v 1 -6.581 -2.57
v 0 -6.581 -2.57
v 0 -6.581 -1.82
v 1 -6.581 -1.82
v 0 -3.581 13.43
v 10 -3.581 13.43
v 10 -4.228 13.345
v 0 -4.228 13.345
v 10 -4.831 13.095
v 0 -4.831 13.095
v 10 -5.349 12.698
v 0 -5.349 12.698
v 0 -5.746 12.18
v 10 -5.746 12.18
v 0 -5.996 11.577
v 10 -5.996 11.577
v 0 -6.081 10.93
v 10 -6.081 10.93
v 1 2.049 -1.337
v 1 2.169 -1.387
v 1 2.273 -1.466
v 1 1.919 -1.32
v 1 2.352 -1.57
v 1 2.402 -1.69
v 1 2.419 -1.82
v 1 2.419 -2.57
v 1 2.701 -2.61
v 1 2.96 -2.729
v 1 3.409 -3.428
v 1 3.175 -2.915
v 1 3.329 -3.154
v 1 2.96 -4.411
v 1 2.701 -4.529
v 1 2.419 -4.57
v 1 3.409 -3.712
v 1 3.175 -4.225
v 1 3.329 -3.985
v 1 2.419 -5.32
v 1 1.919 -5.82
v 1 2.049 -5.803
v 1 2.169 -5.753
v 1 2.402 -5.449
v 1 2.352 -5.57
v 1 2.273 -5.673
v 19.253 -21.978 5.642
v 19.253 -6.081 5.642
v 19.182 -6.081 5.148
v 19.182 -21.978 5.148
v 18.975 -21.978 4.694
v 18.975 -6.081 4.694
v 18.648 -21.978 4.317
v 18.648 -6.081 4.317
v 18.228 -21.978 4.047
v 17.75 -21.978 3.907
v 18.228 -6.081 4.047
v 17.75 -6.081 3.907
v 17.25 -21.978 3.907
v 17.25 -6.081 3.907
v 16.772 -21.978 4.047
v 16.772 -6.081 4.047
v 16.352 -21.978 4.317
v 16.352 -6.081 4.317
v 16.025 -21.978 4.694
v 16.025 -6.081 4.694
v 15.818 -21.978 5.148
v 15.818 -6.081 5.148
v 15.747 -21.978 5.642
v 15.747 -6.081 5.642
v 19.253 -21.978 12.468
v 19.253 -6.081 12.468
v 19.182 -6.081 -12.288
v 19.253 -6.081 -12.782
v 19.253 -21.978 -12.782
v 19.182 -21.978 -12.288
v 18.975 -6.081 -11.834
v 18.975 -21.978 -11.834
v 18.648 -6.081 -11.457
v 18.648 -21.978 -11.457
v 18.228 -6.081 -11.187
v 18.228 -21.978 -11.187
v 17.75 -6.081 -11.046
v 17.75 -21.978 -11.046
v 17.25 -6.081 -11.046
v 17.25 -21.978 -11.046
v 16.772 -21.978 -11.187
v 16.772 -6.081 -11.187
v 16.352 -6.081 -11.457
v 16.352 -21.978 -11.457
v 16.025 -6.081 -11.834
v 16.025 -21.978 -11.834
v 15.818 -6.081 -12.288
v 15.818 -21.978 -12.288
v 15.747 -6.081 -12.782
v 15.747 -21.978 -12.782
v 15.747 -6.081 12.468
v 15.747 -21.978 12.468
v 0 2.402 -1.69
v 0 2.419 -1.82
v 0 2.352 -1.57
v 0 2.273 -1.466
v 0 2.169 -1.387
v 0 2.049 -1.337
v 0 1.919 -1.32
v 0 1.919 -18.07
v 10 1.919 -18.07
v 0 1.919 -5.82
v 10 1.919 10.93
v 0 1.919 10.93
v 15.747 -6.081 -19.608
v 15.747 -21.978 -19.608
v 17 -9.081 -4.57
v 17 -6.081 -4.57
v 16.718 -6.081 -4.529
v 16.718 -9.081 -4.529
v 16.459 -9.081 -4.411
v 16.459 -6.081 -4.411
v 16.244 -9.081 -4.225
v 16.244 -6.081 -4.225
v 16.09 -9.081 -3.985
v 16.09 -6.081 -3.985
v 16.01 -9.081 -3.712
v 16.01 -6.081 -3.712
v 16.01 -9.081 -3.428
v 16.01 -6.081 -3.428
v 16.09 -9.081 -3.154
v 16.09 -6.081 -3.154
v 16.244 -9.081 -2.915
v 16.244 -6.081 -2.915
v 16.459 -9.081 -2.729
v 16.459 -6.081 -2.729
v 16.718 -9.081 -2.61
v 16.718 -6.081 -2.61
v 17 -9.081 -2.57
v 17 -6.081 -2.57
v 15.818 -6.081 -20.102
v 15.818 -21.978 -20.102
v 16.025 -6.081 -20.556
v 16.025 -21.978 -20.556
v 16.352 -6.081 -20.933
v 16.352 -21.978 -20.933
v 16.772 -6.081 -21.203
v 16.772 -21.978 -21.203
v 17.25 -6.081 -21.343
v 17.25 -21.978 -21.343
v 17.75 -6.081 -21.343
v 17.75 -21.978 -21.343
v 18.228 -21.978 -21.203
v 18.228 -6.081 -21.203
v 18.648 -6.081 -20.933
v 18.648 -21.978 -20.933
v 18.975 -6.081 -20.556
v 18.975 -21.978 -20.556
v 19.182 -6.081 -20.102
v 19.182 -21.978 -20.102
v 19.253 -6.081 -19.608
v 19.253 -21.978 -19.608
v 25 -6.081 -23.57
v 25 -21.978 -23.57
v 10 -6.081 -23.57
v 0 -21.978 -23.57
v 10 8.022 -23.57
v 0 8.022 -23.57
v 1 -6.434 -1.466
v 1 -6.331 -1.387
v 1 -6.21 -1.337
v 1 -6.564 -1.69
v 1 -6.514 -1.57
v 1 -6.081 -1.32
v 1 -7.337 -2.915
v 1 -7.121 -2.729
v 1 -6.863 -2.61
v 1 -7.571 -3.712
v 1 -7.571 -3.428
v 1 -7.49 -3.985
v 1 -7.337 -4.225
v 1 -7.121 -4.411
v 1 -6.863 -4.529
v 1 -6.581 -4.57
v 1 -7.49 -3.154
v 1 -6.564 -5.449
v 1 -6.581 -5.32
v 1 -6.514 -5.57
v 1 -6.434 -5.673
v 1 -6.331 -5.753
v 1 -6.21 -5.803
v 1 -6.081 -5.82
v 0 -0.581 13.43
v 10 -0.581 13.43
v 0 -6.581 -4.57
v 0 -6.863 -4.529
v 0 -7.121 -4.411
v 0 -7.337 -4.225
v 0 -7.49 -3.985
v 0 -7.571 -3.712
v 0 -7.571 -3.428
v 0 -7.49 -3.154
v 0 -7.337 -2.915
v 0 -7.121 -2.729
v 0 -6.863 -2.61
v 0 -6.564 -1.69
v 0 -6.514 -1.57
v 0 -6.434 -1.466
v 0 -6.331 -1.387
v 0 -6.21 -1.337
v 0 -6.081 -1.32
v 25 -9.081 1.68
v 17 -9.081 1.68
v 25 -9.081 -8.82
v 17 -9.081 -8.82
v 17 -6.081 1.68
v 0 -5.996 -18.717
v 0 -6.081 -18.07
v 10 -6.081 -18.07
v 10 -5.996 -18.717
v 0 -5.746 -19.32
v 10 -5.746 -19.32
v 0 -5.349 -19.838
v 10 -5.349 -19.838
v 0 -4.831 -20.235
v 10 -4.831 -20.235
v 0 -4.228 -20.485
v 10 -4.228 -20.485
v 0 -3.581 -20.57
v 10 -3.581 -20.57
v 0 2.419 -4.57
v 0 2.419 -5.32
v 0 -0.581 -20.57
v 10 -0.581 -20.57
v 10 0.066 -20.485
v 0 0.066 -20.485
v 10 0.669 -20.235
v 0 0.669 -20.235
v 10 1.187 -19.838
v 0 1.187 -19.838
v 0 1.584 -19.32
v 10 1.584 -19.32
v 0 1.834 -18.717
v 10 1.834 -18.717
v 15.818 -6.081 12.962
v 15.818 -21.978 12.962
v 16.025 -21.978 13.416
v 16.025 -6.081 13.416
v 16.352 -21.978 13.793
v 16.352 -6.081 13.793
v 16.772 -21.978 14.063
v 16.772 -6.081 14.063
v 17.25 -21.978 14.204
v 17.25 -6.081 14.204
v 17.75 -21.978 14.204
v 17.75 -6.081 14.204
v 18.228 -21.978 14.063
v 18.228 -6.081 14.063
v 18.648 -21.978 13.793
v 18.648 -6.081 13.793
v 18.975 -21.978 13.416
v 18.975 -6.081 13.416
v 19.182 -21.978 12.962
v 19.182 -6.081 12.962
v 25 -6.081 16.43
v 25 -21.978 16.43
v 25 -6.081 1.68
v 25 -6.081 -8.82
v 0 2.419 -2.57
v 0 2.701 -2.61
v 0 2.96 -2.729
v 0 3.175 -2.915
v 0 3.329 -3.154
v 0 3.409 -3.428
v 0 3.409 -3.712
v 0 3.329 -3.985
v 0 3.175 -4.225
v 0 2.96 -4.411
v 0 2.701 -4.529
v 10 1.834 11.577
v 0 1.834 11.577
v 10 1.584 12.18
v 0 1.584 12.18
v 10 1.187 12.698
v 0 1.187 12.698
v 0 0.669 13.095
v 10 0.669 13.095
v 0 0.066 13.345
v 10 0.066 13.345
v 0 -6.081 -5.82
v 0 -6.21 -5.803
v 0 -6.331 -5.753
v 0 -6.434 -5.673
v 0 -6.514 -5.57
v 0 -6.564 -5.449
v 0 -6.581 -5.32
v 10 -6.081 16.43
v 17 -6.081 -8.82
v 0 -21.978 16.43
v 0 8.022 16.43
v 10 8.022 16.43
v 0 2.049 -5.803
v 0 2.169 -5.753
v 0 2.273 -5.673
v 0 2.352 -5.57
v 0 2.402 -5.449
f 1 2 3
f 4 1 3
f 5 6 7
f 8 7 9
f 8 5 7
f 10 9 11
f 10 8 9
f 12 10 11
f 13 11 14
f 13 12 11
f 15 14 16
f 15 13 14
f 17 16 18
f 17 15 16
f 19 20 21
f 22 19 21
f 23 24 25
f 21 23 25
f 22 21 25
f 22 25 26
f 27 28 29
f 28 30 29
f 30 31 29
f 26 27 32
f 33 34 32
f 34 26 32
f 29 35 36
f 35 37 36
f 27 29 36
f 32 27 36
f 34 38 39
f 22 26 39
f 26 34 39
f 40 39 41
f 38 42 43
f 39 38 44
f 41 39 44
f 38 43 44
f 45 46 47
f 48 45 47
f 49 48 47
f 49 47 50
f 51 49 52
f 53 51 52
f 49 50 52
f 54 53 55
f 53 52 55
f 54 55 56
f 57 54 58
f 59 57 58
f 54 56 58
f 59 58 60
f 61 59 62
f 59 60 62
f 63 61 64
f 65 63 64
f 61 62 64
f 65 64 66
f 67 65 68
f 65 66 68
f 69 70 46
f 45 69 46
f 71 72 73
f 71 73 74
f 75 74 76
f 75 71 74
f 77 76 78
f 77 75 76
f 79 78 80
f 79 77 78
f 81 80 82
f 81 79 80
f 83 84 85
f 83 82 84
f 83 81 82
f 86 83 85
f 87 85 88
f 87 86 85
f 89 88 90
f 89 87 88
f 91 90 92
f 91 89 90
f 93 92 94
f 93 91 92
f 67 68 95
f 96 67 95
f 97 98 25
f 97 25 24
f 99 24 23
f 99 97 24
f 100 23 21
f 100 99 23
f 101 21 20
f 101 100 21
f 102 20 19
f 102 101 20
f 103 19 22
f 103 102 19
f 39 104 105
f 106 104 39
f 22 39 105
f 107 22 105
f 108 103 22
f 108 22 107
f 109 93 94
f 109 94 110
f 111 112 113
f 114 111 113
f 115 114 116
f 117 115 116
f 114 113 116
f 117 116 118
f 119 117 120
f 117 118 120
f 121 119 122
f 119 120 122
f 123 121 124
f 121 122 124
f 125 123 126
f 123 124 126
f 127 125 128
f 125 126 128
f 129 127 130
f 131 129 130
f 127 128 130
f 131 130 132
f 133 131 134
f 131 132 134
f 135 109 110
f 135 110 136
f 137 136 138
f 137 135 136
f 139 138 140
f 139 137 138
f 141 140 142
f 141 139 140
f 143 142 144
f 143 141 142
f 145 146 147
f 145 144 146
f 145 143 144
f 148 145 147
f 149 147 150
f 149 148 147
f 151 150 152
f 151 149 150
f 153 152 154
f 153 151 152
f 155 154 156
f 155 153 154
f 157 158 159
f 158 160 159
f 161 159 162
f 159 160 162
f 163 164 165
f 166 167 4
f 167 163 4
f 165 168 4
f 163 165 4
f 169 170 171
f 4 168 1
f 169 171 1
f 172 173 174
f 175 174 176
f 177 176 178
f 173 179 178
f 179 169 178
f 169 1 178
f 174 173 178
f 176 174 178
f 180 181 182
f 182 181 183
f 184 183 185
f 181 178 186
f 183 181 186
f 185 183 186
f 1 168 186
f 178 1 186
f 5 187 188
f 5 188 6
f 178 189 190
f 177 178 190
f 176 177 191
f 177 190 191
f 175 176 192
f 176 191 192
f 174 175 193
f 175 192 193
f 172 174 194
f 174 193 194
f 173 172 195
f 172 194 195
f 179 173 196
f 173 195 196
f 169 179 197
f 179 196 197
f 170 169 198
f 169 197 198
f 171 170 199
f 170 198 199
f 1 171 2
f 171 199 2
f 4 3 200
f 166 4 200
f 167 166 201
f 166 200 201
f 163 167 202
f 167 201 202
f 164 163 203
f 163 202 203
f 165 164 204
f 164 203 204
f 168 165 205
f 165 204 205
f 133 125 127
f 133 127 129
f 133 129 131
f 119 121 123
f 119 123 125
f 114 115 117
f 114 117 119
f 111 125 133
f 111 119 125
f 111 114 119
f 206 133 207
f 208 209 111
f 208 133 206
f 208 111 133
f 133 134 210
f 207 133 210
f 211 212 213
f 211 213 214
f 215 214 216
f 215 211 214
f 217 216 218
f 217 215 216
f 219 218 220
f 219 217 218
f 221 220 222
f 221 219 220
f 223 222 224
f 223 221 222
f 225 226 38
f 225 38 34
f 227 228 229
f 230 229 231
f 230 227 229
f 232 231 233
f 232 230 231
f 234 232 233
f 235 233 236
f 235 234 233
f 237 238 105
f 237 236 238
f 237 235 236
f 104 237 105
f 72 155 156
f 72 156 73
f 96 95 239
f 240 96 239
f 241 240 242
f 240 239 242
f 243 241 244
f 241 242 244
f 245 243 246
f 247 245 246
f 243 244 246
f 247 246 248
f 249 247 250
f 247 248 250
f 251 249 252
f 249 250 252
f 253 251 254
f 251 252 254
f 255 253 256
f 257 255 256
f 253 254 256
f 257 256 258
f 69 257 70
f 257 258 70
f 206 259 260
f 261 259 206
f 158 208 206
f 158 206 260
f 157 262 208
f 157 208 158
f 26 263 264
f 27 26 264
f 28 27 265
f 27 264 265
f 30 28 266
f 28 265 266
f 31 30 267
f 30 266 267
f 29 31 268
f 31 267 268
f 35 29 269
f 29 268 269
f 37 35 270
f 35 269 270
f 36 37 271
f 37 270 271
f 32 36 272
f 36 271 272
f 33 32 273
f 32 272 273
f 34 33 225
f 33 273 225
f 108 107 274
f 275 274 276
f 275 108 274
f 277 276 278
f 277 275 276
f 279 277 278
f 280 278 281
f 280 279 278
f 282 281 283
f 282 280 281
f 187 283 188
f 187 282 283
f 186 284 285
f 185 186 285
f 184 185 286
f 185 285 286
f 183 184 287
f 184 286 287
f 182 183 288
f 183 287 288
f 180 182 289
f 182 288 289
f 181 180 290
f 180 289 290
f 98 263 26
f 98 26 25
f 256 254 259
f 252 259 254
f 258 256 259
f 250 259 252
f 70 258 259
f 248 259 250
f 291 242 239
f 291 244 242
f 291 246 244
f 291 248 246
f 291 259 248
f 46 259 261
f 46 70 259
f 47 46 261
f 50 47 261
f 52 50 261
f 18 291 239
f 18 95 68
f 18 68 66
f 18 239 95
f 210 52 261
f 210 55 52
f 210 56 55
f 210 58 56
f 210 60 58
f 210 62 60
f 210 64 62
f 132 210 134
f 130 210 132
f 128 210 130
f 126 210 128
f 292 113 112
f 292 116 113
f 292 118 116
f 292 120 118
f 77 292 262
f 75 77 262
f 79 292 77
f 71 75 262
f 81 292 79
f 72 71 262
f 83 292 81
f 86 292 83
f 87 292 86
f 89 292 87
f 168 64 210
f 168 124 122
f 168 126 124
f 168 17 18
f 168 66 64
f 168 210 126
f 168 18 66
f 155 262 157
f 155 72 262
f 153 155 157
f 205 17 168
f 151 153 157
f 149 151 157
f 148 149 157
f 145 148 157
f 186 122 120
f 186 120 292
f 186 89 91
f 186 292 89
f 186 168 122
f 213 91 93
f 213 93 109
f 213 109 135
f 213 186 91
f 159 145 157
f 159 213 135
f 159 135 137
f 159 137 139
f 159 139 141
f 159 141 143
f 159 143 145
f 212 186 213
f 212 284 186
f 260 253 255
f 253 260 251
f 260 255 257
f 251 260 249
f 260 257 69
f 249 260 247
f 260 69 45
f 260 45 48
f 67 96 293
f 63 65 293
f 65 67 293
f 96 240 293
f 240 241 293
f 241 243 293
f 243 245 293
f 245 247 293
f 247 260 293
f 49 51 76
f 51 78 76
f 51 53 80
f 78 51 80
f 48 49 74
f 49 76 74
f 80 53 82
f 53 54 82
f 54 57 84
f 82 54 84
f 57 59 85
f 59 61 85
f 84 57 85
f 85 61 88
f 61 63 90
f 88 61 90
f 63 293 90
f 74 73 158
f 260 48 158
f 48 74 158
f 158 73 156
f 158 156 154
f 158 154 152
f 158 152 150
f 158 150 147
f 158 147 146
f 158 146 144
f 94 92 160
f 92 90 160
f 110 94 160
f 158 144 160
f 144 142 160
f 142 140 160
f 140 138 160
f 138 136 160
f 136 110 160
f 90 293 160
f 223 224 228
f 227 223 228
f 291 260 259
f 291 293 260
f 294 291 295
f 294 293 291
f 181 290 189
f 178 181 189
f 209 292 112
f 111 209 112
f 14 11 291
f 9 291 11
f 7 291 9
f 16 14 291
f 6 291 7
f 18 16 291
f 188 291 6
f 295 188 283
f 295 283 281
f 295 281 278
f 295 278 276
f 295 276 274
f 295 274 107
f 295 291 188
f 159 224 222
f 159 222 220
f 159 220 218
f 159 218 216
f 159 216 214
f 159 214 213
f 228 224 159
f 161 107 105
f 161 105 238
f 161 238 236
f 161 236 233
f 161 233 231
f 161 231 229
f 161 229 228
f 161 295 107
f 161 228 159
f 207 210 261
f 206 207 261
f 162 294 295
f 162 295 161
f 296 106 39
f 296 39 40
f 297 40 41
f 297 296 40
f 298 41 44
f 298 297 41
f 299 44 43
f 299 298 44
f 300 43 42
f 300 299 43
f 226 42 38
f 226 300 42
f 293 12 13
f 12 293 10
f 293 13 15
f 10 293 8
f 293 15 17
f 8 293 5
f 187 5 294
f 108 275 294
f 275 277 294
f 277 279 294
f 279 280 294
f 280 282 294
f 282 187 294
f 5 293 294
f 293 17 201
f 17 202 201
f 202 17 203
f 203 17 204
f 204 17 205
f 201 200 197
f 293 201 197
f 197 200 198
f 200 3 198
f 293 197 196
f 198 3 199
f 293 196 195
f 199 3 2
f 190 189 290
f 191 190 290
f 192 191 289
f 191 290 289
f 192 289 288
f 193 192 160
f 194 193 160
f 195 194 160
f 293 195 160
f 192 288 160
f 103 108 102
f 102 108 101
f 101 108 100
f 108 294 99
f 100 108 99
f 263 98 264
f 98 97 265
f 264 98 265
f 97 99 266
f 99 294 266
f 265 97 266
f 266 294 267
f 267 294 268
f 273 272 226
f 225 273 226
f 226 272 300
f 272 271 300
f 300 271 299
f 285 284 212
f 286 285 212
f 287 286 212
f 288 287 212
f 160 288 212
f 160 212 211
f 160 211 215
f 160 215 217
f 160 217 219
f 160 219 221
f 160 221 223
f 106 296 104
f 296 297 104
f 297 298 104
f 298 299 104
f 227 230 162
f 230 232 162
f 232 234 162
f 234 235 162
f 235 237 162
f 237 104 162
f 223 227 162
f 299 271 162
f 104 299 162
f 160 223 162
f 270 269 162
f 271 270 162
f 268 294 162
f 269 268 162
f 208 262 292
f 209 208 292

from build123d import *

# Parameters (mm, degrees)
SKETCH1_W                                     = 40
SKETCH1_H                                     = 30
BOSS_EXTRUDE1_DEPTH                           = 10
SKETCH2_W                                     = 4.5
SKETCH2_H                                     = 8
CUT_EXTRUDE1_DEPTH                            = 1
CUT_EXTRUDE2_DEPTH                            = 11
SKETCH4_W                                     = 40
SKETCH4_H                                     = 15.897693
BOSS_EXTRUDE3_DEPTH                           = 15
FIX_DISTANCES_CONVEX_LENS_SEAT_DEPTH          = 3
CHOOSE_SCREW_SIZE_USE_TIGHT_TOLERANCE_C_DEPTH = 16.897693


with BuildPart() as part:
    # Sketch1 → Boss-Extrude1 (new body)
    with BuildSketch(Plane(origin=(0, 0, 0), x_dir=(0, 0, -1), z_dir=(1, 0, 0))):
        with Locations((3.569892473, -6.978494624)):
            Rectangle(SKETCH1_W, SKETCH1_H)
    extrude(amount=BOSS_EXTRUDE1_DEPTH)

    # Sketch2 → Cut-Extrude1 (cut)
    with BuildSketch(Plane.ZY):
        with BuildLine():
            Line((-5.319892473, 2.419198376), (-1.819892473, 2.419198376))
            ThreePointArc((-1.819892473, 2.419198376), (-1.466339083, 2.272751767), (-1.319892473, 1.919198376))
            Line((-1.319892473, 1.919198376), (-5.819892473, 1.919198376))
            ThreePointArc((-5.819892473, 1.919198376), (-5.673445864, 2.272751767), (-5.319892473, 2.419198376))
        make_face()
        with BuildLine():
            Line((-5.319892473, -6.580801624), (-1.819892473, -6.580801624))
            ThreePointArc((-1.819892473, -6.580801624), (-1.466339083, -6.434355014), (-1.319892473, -6.080801624))
            Line((-1.319892473, -6.080801624), (-5.819892473, -6.080801624))
            ThreePointArc((-5.819892473, -6.080801624), (-5.673445864, -6.434355014), (-5.319892473, -6.580801624))
        make_face()
        with Locations((-3.569892473, -2.080801624)):
            Rectangle(SKETCH2_W, SKETCH2_H)
        with BuildLine():
            ThreePointArc((-2.569892473, 2.419198376), (-3.569892473, 3.419198376), (-4.569892473, 2.419198376))
            Line((-4.569892473, 2.419198376), (-2.569892473, 2.419198376))
        make_face()
        with BuildLine():
            Line((-2.569892473, -6.580801624), (-4.569892473, -6.580801624))
            ThreePointArc((-4.569892473, -6.580801624), (-3.569892473, -7.580801624), (-2.569892473, -6.580801624))
        make_face()
    extrude(amount=-CUT_EXTRUDE1_DEPTH, mode=Mode.SUBTRACT)

    # Sketch3 → Cut-Extrude2 (cut, through all)
    with BuildSketch(Plane.ZY):
        with BuildLine():
            Line((-18.069892473, 1.919198376), (10.930107527, 1.919198376))
            ThreePointArc((10.930107527, 1.919198376), (12.69787448, 1.186965329), (13.430107527, -0.580801624))
            Line((13.430107527, -0.580801624), (13.430107527, -3.580801624))
            ThreePointArc((13.430107527, -3.580801624), (12.69787448, -5.348568577), (10.930107527, -6.080801624))
            Line((10.930107527, -6.080801624), (-18.069892473, -6.080801624))
            ThreePointArc((-18.069892473, -6.080801624), (-19.837659426, -5.348568577), (-20.569892473, -3.580801624))
            Line((-20.569892473, -3.580801624), (-20.569892473, -0.580801624))
            ThreePointArc((-20.569892473, -0.580801624), (-19.837659426, 1.186965329), (-18.069892473, 1.919198376))
        make_face()
    extrude(amount=-CUT_EXTRUDE2_DEPTH, mode=Mode.SUBTRACT)

    # Sketch4 → Boss-Extrude3 (add)
    with BuildSketch(Plane(origin=(10, 0, 0), x_dir=(0, 0, -1), z_dir=(1, 0, 0))):
        with Locations((3.569892473, -14.029648124)):
            Rectangle(SKETCH4_W, SKETCH4_H)
    extrude(amount=BOSS_EXTRUDE3_DEPTH)

    # Sketch6 → [fix distances] convex_lens_seat (cut)
    with BuildSketch(Plane(origin=(0, -6.080801624, 0), x_dir=(1, 0, 0), z_dir=(0, 1, 0))):
        Polygon((17, 2.569892473), (17, -1.680107527), (25, -1.680107527), (25, 8.819892473), (17, 8.819892473), (17, 4.569892473), align=None)
        with BuildLine():
            ThreePointArc((17, 4.569892473), (16, 3.569892473), (17, 2.569892473))
            Line((17, 2.569892473), (17, 4.569892473))
        make_face()
    extrude(amount=-FIX_DISTANCES_CONVEX_LENS_SEAT_DEPTH, mode=Mode.SUBTRACT)

    # Sketch7 → [choose screw size, use tight tolerance clearance diameter ] slots (cut, through all)
    with BuildSketch(Plane(origin=(0, -6.080801624, 0), x_dir=(1, 0, 0), z_dir=(0, 1, 0))):
        with BuildLine():
            Line((15.746714751, 12.781776292), (15.746714751, 19.608008654))
            ThreePointArc((15.746714751, 19.608008654), (17.5, 21.361293903), (19.253285249, 19.608008654))
            Line((19.253285249, 19.608008654), (19.253285249, 12.781776292))
            ThreePointArc((19.253285249, 12.781776292), (17.5, 11.028491043), (15.746714751, 12.781776292))
        make_face()
        with BuildLine():
            Line((15.746714751, -5.641991346), (15.746714751, -12.468223708))
            ThreePointArc((15.746714751, -12.468223708), (17.5, -14.221508957), (19.253285249, -12.468223708))
            Line((19.253285249, -12.468223708), (19.253285249, -5.641991346))
            ThreePointArc((19.253285249, -5.641991346), (17.5, -3.888706097), (15.746714751, -5.641991346))
        make_face()
    extrude(amount=-CHOOSE_SCREW_SIZE_USE_TIGHT_TOLERANCE_C_DEPTH, mode=Mode.SUBTRACT)


solid = part.part
